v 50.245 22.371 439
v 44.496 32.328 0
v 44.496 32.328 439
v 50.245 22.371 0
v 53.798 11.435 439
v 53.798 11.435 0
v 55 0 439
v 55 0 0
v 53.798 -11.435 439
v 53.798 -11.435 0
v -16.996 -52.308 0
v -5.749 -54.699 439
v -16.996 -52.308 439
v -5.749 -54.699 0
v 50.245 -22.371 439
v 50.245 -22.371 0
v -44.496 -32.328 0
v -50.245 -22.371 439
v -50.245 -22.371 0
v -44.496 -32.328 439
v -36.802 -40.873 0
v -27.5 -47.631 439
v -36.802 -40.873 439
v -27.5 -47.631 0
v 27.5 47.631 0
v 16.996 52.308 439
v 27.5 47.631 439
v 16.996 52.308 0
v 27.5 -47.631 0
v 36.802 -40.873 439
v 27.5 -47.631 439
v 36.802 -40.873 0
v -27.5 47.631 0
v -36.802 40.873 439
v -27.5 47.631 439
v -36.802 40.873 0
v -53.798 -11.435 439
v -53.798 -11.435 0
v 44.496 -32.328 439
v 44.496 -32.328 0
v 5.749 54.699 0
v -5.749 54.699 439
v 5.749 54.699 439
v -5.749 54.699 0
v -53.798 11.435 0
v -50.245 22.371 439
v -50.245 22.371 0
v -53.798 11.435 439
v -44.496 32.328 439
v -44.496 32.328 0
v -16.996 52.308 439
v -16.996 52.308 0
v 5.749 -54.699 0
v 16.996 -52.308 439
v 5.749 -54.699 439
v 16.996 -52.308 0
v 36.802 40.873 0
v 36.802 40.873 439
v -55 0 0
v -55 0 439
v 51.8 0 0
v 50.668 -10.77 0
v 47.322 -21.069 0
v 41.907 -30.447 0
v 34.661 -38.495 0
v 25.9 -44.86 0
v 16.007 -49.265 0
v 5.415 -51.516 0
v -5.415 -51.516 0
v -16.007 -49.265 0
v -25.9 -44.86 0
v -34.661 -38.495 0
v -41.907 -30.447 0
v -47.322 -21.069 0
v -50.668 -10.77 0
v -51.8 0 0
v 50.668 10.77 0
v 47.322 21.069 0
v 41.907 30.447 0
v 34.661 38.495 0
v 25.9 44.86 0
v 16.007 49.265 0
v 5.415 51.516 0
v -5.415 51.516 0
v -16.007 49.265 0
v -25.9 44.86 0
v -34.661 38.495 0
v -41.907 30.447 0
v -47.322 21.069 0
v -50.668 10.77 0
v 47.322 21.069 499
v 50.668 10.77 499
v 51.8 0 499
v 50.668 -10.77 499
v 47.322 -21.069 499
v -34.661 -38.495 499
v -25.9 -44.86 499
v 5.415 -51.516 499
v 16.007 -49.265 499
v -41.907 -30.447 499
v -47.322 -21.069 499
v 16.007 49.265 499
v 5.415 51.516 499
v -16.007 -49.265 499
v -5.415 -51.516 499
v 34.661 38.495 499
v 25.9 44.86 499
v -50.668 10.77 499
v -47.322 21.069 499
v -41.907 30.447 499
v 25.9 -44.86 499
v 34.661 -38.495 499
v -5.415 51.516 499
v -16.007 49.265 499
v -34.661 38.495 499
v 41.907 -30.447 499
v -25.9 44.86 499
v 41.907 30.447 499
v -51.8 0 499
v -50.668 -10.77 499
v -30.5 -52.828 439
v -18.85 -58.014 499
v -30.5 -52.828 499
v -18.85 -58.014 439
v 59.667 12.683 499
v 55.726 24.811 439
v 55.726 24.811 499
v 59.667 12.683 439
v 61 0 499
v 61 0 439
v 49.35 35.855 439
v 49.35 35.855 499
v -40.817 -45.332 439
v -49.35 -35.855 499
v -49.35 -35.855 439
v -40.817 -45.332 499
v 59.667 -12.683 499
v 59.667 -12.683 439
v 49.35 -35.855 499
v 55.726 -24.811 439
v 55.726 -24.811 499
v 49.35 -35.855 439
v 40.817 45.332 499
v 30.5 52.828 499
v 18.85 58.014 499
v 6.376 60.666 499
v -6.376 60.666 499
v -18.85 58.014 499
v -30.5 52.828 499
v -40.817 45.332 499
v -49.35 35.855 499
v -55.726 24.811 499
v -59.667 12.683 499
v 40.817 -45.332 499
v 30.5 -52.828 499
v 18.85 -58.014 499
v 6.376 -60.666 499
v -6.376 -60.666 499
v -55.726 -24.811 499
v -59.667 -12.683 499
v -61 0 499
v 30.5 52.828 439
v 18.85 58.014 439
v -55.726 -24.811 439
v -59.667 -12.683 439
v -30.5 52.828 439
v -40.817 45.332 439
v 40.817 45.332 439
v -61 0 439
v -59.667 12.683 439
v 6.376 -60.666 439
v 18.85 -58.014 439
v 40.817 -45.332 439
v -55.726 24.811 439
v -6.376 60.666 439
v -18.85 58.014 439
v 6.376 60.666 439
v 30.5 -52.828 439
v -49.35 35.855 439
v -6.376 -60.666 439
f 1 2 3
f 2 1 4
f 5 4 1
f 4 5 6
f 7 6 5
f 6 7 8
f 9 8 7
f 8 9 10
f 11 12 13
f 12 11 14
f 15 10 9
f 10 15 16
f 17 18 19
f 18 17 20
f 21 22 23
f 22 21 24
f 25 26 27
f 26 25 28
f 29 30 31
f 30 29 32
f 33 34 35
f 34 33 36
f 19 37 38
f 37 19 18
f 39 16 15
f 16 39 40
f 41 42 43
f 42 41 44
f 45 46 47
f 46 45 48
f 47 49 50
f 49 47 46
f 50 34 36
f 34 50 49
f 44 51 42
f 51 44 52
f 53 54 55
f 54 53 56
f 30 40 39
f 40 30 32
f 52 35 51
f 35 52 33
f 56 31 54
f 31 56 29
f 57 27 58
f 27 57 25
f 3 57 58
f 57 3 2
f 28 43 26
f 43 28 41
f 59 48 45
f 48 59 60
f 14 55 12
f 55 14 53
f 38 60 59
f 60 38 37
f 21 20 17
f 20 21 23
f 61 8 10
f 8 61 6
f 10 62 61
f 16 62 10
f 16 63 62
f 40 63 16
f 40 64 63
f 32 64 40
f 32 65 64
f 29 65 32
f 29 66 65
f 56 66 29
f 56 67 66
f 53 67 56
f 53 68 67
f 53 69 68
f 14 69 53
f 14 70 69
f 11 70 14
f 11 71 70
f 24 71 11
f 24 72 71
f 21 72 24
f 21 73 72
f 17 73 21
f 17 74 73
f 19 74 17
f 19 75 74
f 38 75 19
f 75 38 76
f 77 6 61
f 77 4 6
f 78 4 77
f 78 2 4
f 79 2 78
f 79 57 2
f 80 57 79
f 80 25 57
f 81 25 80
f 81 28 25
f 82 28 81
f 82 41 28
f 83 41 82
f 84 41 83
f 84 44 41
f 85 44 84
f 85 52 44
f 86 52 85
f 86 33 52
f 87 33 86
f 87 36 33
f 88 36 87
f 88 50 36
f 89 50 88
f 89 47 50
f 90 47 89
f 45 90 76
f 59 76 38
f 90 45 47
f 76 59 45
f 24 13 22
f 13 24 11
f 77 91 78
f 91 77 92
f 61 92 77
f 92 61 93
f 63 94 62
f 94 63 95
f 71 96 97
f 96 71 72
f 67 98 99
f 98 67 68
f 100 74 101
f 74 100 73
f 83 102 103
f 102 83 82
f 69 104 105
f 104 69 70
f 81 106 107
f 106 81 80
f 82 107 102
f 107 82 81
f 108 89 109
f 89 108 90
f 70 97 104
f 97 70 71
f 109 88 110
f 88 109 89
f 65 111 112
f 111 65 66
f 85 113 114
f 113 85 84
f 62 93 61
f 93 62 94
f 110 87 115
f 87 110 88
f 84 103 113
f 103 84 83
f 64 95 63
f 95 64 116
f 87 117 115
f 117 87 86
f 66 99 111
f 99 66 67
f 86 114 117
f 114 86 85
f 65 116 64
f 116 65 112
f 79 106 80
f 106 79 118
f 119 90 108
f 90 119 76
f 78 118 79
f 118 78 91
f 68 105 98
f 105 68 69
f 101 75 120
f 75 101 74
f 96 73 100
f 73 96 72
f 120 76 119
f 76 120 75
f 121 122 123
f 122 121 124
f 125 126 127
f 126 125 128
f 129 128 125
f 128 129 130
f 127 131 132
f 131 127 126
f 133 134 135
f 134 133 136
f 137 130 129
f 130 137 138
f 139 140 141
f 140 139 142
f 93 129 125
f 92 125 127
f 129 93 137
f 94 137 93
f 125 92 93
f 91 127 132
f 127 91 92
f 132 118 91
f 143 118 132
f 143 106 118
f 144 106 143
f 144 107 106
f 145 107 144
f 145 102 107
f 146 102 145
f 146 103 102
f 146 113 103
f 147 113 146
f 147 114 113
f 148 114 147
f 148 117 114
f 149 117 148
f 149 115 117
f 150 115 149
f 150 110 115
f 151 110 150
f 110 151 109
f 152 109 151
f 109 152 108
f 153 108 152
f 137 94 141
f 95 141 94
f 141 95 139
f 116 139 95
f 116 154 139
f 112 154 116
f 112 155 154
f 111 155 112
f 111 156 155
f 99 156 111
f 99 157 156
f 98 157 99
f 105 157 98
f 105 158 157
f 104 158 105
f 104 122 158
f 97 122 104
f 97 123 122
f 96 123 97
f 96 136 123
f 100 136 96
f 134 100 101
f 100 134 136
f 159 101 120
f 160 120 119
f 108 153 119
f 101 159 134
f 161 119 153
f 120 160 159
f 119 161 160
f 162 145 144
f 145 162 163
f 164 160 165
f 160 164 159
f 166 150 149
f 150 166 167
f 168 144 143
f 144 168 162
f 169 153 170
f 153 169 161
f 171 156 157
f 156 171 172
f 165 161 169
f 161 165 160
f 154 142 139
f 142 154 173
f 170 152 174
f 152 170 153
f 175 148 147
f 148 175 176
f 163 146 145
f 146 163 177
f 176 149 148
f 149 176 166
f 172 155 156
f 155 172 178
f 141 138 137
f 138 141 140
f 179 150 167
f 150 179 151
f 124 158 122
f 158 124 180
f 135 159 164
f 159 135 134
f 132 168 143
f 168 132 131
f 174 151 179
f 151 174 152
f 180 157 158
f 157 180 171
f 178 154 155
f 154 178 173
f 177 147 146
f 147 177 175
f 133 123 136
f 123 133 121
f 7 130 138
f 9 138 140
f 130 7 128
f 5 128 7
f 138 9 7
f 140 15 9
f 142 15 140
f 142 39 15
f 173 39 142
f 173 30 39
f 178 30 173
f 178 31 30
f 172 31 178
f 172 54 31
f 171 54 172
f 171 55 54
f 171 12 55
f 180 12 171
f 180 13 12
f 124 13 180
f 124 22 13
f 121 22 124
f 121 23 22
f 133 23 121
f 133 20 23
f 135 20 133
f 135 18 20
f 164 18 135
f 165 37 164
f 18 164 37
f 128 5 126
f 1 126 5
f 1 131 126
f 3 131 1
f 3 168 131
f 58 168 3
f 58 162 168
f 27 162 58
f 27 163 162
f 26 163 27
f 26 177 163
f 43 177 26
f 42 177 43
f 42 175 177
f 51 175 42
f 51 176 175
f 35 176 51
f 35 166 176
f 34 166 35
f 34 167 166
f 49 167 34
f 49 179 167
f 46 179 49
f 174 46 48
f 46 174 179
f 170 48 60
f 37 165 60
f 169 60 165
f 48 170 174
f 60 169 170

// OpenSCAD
// Parameters
pipe_standard = 1; //[1:1:1]
nominal_diameter_mm = 110; //[55:220:1]
length_mm = 500; //[250:1000:1]
end_fitting = 1; //[0:1:1]
wall_thickness_mm = 3.2; //[1.6:6.4:0.1]
fitting_length_mm = 60; //[30:120:1]
fitting_radial_extra_mm = 6; //[2:15:0.5]
connection_overlap_mm = 1; //[0.5:2:0.1]

// Ht Pipe - complete geometry
module ht_pipe() {
  color([0.85, 0.85, 0.8]) { // PVC color
    // Pipe body
    difference() {
      cylinder(h=length_mm - (end_fitting * fitting_length_mm) + connection_overlap_mm, 
               r=nominal_diameter_mm/2, center=false);
      translate([0, 0, 0])
        cylinder(h=length_mm - (end_fitting * fitting_length_mm) + connection_overlap_mm, 
                 r=nominal_diameter_mm/2 - wall_thickness_mm, center=false);
    }
    
    // Integrated end fitting
    if (end_fitting == 1) {
      difference() {
        translate([0, 0, length_mm - (end_fitting * fitting_length_mm) - connection_overlap_mm])
          cylinder(h=end_fitting * fitting_length_mm, 
                   r=nominal_diameter_mm/2 + fitting_radial_extra_mm, center=false);
        translate([0, 0, length_mm - (end_fitting * fitting_length_mm) - connection_overlap_mm])
          cylinder(h=end_fitting * fitting_length_mm, 
                   r=nominal_diameter_mm/2 - wall_thickness_mm, center=false);
      }
    }
  }
}

// Assembly
module assembly() {
  ht_pipe();
}

assembly();
